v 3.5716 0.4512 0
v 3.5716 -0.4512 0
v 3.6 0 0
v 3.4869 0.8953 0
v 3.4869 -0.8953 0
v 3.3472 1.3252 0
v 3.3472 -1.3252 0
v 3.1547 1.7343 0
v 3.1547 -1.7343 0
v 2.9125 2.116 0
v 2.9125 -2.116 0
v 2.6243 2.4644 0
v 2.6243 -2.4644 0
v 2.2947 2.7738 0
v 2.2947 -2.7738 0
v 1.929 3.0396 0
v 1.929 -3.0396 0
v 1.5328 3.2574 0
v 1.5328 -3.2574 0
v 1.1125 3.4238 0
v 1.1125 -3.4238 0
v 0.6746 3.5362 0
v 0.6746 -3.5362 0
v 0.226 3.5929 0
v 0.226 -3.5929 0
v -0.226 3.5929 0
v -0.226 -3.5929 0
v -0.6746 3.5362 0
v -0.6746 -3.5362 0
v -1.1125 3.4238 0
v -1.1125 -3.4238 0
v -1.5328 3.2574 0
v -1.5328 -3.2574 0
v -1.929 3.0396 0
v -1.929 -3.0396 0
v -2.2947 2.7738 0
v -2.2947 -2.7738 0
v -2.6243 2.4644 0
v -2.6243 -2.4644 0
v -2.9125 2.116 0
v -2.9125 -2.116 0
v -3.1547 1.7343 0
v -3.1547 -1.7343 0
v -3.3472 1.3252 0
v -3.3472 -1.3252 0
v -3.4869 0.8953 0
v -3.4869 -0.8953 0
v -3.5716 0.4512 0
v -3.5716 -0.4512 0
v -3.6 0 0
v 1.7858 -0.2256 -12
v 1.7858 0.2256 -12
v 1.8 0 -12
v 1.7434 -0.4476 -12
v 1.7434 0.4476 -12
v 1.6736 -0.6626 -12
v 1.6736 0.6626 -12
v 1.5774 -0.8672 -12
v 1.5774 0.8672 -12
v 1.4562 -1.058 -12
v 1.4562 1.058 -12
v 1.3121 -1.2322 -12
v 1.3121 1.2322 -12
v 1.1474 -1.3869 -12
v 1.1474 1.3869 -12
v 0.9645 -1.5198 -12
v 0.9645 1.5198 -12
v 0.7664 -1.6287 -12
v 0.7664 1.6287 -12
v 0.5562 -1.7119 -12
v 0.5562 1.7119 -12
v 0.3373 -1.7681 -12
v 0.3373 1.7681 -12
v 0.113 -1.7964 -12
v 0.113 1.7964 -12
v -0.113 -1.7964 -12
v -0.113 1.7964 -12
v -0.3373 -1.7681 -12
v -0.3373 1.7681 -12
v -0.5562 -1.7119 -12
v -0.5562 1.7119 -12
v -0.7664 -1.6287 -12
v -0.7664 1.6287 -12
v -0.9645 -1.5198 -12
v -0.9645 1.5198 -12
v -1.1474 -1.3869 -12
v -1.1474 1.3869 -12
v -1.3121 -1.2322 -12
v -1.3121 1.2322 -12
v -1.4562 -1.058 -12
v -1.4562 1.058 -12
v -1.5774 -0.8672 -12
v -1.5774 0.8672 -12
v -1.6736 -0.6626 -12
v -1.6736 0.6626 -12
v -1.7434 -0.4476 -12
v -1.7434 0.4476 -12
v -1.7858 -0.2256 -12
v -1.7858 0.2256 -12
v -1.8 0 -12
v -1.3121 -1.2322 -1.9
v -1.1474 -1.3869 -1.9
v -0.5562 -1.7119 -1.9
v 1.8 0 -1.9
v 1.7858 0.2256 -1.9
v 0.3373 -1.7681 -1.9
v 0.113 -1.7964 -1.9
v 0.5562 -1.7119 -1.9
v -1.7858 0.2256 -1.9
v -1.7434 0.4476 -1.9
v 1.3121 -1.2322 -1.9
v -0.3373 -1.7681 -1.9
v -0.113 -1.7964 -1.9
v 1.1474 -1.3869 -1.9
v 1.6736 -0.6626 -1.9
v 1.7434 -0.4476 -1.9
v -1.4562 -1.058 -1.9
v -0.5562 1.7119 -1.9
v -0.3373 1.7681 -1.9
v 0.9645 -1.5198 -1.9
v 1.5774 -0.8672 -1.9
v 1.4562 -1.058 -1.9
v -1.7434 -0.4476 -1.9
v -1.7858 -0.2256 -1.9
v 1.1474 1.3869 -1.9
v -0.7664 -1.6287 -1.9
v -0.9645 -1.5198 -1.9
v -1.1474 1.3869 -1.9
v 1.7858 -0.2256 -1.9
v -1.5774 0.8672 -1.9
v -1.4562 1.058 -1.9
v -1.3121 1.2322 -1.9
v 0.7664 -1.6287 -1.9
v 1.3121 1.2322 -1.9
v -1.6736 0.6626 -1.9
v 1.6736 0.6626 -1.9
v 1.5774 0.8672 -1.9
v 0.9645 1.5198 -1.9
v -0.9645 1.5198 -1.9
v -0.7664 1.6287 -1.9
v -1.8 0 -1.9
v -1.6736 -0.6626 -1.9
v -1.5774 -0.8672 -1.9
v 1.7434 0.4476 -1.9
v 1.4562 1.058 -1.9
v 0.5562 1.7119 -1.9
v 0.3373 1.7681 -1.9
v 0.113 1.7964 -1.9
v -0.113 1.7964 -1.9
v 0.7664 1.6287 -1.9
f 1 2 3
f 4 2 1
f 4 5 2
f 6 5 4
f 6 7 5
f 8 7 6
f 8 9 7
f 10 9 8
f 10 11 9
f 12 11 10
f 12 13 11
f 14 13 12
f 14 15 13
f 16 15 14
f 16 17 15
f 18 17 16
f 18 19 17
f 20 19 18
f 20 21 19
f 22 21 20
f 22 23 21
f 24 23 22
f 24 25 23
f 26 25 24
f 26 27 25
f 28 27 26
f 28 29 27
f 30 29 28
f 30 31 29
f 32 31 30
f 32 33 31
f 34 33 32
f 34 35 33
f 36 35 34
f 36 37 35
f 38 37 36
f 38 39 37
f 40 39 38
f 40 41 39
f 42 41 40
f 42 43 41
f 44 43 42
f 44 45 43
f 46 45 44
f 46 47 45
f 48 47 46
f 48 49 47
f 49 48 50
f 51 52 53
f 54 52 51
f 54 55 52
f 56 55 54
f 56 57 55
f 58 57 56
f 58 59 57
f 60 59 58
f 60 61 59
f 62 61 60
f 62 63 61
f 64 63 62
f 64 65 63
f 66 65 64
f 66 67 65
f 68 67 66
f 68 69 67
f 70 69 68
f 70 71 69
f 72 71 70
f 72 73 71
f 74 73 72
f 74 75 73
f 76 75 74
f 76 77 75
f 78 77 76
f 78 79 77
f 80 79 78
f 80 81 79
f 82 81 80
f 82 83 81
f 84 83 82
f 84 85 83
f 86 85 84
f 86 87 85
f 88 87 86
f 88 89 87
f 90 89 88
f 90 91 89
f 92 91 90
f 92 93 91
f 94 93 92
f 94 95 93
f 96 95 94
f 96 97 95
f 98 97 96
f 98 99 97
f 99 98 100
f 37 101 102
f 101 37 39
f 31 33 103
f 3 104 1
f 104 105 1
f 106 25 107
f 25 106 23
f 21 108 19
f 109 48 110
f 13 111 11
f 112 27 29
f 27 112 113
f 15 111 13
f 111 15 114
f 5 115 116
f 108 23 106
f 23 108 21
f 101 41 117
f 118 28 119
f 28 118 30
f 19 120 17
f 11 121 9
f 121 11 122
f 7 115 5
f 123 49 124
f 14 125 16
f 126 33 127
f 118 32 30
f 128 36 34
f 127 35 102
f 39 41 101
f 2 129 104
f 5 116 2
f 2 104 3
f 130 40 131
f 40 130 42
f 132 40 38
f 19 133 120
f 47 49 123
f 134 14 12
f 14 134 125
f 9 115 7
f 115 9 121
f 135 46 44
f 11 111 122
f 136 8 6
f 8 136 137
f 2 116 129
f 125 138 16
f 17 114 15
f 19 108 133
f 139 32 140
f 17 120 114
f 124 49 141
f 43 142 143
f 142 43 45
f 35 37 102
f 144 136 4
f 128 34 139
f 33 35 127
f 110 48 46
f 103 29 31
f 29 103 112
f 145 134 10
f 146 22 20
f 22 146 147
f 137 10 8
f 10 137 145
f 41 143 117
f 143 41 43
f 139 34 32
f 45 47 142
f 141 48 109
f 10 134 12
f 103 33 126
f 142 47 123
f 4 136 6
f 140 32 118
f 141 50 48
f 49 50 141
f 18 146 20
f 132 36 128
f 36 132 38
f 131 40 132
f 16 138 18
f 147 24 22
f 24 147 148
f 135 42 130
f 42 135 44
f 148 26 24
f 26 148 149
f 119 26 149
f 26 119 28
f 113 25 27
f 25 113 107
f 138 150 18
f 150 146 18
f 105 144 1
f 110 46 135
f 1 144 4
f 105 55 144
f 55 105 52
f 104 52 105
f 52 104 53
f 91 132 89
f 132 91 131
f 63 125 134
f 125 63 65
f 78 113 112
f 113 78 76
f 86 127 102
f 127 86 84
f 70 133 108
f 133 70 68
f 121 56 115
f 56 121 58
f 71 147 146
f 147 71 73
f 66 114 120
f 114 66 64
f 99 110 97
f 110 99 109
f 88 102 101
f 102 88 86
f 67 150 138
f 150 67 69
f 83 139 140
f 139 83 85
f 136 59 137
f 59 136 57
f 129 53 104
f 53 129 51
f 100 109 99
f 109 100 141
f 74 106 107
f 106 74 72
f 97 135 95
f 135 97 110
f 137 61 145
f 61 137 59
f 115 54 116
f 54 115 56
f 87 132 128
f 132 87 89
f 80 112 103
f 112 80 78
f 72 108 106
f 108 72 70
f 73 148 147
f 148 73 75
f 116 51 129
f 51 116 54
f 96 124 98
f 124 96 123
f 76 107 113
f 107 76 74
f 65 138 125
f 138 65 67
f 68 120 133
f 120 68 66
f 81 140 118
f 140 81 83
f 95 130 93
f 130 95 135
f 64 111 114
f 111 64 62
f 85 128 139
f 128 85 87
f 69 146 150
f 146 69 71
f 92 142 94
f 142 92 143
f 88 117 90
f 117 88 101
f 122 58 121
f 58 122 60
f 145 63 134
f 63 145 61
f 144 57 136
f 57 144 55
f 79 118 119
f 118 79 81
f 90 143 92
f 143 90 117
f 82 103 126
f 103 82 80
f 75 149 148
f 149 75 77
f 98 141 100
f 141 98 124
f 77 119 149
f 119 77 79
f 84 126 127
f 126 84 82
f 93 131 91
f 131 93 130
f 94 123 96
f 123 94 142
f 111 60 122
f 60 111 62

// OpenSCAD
$fn = 50;


difference() {
	union() {
		translate(v = [0, 0, 0]) {
			rotate(a = [0, 0, 0]) {
				difference() {
					union() {
						translate(v = [0, 0, -12.0000000000]) {
							cylinder(h = 12, r = 1.5000000000);
						}
						translate(v = [0, 0, -1.9000000000]) {
							cylinder(h = 1.9000000000, r1 = 1.8000000000, r2 = 3.6000000000);
						}
						translate(v = [0, 0, -12.0000000000]) {
							cylinder(h = 12, r = 1.8000000000);
						}
						translate(v = [0, 0, -12.0000000000]) {
							cylinder(h = 12, r = 1.5000000000);
						}
					}
					union();
				}
			}
		}
	}
	union();
}
